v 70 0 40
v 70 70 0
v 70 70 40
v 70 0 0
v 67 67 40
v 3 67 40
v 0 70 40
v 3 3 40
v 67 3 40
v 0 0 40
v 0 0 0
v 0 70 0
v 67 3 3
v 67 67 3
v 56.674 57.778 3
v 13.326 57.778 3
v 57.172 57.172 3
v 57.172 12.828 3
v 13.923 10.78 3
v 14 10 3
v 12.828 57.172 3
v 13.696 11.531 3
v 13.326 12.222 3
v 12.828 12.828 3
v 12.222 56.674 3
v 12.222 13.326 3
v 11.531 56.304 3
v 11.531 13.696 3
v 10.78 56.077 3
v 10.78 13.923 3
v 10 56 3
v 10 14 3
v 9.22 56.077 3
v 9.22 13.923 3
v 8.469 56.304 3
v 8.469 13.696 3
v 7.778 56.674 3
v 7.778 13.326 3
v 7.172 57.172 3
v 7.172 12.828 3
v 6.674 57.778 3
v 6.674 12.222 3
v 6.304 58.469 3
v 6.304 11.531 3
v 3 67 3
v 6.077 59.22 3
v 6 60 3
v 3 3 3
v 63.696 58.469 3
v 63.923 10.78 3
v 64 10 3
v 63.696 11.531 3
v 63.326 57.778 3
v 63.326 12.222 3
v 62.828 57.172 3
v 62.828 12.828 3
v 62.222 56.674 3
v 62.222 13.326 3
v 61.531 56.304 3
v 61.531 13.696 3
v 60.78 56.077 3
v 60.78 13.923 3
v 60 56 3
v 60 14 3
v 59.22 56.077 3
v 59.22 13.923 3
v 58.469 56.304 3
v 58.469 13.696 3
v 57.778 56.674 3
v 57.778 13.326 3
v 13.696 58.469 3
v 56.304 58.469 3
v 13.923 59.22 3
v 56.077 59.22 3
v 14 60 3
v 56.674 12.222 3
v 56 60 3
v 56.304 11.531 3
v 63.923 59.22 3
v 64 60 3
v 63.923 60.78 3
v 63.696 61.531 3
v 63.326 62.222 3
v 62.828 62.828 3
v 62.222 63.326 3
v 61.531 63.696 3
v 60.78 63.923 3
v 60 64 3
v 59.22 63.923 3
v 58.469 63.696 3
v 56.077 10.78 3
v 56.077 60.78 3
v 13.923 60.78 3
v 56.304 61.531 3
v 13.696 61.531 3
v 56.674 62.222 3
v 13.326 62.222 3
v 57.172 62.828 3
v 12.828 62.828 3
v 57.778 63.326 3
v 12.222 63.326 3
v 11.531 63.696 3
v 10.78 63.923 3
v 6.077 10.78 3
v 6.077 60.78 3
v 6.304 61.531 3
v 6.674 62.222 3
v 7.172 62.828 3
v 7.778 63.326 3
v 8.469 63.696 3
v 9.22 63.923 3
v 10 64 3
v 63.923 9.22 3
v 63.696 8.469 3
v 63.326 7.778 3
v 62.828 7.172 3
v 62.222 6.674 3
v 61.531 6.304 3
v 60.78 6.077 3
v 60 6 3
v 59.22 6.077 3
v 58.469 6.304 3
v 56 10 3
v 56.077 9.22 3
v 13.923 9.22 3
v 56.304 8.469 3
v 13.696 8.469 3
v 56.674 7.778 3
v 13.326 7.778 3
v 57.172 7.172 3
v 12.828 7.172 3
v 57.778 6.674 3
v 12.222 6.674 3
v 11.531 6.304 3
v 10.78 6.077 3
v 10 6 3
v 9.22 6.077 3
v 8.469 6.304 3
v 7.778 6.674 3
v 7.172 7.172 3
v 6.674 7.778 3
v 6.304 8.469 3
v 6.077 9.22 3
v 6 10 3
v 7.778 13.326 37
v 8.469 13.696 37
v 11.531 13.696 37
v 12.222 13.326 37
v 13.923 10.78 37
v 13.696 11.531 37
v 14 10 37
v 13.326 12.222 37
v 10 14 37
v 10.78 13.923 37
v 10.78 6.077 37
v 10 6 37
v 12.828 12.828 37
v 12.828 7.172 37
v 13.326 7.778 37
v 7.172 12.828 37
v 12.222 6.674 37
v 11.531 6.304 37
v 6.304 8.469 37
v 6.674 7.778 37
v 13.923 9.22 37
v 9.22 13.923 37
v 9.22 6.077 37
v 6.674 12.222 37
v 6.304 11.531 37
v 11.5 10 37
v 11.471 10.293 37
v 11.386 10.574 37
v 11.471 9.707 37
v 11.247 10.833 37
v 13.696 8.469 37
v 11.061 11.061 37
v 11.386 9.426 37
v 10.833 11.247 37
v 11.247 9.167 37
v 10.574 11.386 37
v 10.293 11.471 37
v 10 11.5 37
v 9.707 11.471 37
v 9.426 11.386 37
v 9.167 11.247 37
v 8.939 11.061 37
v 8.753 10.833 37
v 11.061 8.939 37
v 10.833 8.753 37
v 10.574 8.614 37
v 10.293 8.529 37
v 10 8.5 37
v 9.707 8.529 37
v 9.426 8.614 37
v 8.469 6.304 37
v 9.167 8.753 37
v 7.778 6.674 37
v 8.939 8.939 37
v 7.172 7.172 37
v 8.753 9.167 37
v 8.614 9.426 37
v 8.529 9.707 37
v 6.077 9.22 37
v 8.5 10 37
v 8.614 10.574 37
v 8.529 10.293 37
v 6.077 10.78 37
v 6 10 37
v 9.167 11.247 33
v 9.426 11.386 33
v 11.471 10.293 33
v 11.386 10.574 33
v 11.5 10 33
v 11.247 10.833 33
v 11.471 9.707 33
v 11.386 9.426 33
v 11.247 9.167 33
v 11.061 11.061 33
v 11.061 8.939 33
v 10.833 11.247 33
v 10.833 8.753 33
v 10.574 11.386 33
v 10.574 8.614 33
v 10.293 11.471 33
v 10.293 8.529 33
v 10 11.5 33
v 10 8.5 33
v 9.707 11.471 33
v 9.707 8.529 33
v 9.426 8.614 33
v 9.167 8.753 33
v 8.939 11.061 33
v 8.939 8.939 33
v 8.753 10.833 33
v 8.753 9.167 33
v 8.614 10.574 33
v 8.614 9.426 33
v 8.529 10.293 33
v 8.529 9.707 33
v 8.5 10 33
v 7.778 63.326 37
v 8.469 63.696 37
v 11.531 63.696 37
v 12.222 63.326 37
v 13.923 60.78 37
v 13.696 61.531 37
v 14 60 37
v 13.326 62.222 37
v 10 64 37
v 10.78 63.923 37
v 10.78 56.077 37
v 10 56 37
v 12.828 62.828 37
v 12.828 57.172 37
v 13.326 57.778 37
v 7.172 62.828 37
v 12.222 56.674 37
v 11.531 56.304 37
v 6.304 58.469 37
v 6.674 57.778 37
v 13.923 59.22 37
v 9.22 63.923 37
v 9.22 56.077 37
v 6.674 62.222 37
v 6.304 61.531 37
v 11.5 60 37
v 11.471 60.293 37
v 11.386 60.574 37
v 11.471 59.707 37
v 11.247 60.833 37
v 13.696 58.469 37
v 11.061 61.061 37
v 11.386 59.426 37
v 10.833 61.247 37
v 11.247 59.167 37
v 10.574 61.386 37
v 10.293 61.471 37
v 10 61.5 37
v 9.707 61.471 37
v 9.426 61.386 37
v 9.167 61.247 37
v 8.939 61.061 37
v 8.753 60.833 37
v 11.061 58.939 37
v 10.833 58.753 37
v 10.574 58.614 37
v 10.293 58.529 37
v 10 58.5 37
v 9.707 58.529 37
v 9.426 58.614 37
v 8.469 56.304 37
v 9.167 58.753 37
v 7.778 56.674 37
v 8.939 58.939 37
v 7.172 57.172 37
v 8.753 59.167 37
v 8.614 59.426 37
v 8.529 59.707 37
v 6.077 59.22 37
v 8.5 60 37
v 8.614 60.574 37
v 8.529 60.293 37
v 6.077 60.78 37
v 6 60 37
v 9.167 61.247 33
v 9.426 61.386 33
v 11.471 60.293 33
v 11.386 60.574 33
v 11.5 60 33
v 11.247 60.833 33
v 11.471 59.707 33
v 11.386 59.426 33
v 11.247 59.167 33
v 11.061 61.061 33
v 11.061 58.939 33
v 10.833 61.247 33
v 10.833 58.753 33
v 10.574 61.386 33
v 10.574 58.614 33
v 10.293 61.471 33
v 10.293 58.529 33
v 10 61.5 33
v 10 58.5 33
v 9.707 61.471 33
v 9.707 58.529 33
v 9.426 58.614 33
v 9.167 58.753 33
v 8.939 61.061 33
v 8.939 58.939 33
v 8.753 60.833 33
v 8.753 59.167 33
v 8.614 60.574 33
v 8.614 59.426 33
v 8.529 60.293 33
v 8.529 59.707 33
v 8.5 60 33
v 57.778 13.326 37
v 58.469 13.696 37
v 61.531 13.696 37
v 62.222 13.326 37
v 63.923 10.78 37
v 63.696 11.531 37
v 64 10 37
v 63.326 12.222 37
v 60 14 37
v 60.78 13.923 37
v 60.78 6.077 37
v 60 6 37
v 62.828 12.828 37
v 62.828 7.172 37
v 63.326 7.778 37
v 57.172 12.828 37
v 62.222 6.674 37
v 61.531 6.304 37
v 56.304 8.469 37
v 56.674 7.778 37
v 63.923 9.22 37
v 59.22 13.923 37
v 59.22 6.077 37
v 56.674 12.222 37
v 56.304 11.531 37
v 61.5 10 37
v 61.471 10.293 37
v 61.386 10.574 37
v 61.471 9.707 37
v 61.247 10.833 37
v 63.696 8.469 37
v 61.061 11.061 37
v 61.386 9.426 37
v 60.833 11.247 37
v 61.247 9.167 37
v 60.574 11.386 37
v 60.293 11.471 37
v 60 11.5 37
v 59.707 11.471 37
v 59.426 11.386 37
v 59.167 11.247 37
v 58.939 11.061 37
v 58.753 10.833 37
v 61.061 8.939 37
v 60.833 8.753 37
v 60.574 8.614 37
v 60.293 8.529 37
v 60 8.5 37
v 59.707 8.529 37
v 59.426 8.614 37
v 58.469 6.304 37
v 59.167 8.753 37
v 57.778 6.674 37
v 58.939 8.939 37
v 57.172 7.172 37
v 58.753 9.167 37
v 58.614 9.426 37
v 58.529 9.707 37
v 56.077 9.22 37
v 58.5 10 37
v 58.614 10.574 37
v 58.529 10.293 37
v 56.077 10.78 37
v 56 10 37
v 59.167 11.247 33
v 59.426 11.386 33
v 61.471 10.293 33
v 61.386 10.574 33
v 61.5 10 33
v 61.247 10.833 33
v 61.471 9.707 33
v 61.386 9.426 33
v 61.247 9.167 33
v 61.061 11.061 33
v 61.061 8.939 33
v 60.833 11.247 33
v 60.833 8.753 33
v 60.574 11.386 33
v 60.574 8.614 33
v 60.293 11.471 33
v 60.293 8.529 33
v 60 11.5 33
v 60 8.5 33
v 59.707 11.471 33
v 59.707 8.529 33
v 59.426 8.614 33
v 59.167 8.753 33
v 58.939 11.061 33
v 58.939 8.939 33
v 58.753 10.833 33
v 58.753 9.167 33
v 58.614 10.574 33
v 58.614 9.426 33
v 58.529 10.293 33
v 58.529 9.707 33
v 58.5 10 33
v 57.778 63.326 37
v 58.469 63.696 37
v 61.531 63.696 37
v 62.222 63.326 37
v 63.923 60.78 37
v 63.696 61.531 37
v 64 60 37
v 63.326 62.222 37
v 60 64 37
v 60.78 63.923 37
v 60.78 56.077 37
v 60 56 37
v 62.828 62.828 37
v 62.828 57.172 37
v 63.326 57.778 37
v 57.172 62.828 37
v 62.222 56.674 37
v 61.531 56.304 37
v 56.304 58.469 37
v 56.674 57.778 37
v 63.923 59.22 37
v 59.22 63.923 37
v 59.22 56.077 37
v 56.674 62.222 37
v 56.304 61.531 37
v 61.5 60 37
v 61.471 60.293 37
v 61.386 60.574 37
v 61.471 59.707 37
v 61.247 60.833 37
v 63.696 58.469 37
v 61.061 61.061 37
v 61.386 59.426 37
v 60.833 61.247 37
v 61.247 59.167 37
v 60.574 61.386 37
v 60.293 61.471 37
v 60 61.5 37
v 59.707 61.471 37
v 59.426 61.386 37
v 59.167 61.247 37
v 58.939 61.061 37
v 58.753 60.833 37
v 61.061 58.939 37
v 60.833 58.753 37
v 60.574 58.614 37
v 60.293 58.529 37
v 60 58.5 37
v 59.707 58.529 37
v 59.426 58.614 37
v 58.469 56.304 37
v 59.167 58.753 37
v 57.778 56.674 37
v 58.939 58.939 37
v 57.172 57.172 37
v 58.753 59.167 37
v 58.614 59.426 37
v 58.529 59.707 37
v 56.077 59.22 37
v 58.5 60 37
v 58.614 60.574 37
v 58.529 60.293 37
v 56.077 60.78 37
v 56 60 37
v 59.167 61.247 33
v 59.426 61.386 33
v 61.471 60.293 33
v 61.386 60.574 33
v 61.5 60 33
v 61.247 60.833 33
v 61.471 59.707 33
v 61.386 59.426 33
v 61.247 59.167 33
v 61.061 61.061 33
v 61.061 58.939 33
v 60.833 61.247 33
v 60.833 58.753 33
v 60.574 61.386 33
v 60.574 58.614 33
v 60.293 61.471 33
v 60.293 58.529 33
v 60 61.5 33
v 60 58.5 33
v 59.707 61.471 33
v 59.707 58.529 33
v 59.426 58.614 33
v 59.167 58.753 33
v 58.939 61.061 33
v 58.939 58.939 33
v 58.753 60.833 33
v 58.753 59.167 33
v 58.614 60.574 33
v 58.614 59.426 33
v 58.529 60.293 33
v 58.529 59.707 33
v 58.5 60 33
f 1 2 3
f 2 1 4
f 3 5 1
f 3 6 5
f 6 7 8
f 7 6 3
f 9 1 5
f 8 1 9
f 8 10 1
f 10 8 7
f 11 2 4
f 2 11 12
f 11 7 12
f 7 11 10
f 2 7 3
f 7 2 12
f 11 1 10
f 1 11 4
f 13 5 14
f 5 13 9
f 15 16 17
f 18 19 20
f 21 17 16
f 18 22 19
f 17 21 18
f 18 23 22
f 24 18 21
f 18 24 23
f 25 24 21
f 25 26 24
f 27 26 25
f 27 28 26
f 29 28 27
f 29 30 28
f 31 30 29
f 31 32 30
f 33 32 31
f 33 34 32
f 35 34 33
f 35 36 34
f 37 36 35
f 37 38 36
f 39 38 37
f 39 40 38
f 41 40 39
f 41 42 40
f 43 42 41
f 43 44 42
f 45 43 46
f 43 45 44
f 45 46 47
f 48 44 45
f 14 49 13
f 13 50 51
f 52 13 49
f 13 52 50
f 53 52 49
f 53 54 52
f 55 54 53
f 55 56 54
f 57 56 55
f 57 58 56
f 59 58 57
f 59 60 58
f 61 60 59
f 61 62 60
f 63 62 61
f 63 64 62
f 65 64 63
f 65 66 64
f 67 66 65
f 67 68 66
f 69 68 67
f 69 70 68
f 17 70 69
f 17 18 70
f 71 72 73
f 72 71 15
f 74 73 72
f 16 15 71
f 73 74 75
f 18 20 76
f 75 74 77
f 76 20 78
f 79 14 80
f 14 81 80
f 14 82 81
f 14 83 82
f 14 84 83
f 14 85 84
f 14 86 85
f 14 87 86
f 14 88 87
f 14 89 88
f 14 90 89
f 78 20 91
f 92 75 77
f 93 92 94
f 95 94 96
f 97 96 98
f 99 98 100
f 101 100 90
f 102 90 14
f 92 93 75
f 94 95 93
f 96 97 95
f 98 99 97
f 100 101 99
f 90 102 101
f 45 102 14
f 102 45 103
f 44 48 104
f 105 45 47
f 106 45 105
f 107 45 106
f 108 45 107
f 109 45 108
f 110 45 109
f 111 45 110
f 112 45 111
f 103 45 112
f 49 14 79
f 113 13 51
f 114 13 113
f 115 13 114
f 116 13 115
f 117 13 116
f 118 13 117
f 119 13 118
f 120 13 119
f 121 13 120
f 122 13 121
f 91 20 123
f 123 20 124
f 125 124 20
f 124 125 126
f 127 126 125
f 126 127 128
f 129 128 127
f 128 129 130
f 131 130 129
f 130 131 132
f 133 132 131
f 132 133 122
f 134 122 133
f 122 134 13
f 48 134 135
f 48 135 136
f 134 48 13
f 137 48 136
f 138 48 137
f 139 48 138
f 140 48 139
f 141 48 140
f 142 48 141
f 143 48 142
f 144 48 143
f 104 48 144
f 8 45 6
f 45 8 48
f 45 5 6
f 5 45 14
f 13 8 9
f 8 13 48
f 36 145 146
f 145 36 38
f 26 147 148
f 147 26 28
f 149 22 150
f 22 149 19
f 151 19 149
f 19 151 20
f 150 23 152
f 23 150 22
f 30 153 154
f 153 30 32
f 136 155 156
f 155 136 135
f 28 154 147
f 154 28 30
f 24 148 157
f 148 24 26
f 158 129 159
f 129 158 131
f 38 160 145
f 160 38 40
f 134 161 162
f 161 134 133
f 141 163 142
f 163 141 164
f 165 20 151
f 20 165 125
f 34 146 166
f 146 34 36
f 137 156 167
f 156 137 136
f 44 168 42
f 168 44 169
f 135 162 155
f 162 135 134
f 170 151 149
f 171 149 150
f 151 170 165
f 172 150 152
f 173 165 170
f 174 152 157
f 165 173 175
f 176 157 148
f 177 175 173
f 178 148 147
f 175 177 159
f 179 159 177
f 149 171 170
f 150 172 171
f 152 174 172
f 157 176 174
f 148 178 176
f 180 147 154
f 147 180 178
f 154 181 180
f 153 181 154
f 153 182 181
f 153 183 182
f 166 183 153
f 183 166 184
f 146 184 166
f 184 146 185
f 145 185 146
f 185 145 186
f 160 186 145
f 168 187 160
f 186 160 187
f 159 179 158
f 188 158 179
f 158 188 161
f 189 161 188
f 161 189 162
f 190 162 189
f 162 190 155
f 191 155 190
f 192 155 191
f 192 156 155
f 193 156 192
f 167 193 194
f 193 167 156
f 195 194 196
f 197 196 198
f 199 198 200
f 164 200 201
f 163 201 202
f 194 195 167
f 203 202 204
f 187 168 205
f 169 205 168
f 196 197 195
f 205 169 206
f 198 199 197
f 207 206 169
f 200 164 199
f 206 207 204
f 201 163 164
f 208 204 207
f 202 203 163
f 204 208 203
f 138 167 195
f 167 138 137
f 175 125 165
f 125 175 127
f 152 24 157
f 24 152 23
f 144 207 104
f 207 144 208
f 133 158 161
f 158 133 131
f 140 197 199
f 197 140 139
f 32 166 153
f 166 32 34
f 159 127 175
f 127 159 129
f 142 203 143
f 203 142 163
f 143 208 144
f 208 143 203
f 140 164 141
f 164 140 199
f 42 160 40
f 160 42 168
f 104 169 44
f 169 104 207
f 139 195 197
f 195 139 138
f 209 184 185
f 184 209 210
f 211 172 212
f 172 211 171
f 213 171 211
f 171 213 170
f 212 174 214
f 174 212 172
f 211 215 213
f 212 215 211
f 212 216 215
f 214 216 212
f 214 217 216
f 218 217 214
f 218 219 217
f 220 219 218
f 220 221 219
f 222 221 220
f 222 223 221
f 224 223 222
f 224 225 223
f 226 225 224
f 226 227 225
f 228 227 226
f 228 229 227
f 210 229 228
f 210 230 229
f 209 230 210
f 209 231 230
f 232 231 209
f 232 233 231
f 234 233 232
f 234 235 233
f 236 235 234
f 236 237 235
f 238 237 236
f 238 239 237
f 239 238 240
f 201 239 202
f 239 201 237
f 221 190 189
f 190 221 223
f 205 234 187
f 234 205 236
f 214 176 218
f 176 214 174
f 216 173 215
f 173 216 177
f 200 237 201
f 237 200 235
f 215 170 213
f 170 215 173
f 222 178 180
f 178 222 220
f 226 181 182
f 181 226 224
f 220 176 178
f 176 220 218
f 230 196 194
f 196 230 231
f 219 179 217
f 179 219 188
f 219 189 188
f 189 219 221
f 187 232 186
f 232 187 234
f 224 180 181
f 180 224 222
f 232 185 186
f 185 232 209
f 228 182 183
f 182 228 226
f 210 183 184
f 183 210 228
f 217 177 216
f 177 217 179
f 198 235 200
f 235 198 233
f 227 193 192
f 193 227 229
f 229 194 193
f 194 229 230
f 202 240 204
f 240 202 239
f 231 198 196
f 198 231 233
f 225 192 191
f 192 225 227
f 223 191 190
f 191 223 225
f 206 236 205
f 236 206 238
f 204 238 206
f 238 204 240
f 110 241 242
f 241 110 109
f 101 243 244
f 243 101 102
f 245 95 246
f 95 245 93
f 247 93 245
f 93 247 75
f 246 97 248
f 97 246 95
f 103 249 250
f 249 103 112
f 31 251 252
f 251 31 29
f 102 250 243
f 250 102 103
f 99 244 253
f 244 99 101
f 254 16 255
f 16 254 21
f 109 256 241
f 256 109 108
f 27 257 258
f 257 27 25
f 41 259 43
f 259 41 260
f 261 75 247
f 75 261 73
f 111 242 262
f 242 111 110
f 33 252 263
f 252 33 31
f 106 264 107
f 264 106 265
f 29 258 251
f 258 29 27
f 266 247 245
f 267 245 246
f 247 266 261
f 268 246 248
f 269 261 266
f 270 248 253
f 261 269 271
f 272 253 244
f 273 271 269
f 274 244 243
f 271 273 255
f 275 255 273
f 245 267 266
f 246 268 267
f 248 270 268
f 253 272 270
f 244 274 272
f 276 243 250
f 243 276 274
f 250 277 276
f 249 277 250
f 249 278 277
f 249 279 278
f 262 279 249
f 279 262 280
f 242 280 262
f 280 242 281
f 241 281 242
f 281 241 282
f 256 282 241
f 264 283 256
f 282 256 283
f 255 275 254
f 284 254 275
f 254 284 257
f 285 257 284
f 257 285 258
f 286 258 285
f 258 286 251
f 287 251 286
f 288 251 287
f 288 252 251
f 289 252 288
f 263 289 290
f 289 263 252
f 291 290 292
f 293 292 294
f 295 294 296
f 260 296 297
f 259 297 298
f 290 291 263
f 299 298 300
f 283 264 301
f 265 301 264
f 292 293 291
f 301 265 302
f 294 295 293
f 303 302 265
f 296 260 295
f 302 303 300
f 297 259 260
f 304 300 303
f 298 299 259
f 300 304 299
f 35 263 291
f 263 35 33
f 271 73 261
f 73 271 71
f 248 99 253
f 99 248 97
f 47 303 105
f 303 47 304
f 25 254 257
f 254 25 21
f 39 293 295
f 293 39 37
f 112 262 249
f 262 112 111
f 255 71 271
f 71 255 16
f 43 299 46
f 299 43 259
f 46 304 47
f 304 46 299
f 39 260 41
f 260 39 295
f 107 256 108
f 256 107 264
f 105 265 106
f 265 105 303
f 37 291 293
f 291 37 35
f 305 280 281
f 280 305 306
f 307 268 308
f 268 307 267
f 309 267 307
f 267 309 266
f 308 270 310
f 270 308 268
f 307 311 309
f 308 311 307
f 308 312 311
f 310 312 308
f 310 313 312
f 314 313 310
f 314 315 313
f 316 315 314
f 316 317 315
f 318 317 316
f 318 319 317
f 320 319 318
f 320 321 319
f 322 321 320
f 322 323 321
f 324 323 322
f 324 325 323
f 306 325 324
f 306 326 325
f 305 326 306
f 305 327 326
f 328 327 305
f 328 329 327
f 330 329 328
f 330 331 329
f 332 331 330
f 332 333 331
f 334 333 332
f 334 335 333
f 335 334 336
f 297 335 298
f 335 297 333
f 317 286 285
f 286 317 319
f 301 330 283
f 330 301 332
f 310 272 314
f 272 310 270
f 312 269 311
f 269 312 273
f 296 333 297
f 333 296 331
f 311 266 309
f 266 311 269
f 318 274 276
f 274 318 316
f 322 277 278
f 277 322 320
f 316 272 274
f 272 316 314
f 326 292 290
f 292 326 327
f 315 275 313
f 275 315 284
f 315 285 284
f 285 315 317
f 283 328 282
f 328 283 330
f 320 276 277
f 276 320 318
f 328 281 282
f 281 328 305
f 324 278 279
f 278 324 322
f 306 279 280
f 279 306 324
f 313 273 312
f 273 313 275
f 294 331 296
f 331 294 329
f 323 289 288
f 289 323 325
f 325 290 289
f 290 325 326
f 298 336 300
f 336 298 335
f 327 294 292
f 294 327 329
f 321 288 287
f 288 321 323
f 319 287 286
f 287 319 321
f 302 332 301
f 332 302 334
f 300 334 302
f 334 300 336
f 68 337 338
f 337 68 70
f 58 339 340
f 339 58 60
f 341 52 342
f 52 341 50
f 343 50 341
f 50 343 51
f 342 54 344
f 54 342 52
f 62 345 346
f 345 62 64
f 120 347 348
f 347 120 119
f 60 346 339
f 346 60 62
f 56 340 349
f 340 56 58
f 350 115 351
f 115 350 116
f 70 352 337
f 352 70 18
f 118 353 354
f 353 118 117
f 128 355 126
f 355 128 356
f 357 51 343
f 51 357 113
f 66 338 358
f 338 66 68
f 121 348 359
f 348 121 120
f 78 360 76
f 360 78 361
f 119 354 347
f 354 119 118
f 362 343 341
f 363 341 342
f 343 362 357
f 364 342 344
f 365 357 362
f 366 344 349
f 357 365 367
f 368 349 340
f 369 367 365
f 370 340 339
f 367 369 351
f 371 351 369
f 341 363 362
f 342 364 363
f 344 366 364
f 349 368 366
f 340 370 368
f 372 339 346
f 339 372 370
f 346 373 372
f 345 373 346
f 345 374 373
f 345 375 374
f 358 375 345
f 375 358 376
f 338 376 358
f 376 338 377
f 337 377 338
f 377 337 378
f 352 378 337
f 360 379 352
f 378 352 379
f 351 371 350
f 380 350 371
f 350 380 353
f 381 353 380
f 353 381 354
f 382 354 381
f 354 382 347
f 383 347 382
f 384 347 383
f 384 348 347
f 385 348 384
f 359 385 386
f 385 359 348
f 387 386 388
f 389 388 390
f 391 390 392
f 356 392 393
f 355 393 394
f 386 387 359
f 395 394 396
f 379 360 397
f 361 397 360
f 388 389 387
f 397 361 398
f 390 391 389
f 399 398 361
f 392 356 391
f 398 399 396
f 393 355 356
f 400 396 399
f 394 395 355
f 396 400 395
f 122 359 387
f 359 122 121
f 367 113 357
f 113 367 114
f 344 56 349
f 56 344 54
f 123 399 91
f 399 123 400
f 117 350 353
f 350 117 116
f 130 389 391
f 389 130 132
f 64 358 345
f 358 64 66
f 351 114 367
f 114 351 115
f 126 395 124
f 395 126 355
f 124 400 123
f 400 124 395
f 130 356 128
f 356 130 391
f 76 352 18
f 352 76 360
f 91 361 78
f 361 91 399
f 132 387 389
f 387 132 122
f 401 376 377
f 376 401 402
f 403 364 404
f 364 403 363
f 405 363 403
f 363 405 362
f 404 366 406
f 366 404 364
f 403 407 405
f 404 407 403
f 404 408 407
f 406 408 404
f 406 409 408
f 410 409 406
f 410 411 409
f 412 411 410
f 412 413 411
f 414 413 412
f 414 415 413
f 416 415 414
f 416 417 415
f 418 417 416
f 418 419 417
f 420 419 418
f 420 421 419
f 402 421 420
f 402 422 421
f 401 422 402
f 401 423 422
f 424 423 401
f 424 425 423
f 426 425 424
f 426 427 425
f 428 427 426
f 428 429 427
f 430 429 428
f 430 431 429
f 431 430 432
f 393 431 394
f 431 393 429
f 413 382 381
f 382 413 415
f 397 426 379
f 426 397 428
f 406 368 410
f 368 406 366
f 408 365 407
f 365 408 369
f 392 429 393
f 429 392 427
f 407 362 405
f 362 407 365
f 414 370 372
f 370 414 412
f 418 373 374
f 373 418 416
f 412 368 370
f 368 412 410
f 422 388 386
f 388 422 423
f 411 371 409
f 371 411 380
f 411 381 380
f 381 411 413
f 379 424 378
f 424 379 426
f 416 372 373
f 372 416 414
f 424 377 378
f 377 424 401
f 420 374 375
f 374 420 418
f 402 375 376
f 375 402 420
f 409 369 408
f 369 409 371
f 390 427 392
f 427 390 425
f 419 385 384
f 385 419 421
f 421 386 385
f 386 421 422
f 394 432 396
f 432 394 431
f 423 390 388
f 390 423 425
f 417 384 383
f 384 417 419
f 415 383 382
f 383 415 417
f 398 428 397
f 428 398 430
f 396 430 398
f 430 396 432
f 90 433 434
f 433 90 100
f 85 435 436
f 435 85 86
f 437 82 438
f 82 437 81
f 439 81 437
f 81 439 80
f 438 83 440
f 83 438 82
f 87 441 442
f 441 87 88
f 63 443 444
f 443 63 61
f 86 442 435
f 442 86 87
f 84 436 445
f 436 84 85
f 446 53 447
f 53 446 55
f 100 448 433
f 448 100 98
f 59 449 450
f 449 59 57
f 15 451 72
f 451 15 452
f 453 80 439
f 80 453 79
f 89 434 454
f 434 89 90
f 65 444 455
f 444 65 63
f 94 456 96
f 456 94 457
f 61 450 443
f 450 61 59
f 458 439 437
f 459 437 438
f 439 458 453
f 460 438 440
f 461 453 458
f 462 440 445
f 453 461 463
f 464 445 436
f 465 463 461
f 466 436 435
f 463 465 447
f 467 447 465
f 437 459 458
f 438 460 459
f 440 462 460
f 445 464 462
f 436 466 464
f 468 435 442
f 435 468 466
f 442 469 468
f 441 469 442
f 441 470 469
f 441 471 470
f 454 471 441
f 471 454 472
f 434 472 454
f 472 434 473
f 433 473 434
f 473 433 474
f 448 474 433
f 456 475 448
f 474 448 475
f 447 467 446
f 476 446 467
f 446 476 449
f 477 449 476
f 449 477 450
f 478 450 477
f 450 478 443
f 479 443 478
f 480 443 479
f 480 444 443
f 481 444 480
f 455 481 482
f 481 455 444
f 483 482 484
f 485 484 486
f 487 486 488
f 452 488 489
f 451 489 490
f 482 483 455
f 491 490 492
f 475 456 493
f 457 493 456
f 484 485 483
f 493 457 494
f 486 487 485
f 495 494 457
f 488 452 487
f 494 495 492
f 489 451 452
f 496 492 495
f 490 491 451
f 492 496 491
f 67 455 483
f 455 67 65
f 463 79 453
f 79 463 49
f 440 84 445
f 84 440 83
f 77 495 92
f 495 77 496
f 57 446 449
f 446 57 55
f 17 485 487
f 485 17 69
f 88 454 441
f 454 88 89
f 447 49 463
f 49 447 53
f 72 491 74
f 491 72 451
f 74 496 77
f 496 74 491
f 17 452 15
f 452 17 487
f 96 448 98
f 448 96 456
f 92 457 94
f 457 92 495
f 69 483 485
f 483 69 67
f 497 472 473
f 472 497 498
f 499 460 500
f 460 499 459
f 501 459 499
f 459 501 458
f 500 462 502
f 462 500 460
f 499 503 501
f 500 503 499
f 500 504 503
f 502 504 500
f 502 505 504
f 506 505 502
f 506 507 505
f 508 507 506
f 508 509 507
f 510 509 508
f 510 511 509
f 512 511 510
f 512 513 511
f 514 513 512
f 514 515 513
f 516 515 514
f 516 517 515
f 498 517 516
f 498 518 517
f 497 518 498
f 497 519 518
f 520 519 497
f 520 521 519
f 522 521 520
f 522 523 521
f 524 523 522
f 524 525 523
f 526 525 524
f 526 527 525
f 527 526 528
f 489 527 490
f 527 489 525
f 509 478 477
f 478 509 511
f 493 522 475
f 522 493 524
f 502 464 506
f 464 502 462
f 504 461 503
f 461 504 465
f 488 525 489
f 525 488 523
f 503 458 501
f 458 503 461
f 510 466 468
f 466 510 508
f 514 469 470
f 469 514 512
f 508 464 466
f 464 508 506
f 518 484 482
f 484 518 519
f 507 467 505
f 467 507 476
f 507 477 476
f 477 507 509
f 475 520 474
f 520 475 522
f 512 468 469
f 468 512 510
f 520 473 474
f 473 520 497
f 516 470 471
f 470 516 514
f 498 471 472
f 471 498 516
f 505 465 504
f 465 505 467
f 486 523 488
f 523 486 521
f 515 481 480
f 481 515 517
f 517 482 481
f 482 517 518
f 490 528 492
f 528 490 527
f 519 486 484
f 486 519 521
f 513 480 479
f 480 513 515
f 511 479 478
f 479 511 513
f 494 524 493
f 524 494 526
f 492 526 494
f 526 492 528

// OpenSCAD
$fn = 32;

// ----------------------------------------------------------------------
// Enclosure box: bosses enclosure
// ----------------------------------------------------------------------

// --- parameters (mm) ---
box_l = 70;               // outer length, X
box_w = 70;               // outer width, Y
box_h = 40;               // outer height
wall_t = 3;               // wall thickness
boss_r = 4;               // corner boss radius
hole_r = 1.5;             // boss screw hole radius
boss_in = 10;             // boss inset from the corners
fit_tol = 0.05;           // tolerance for press fits, mm
free_tol = 0.3;           // tolerance for clearance fits, mm

inner_h = box_h - wall_t;  // cavity depth
boss_h = inner_h - 2;  // corner boss height

difference() {
  union() {
    difference() {
      cube([box_l, box_w, box_h]);
      translate([wall_t, wall_t, wall_t])
        cube([box_l - 2 * wall_t, box_w - 2 * wall_t, box_h]);
    }
    for (sx = [0, 1], sy = [0, 1])
      translate([sx ? box_l - boss_in : boss_in,
                 sy ? box_w - boss_in : boss_in, wall_t - 1])
        difference() {
          cylinder(r = boss_r, h = boss_h);
          translate([0, 0, boss_h - 4])
            cylinder(r = hole_r, h = 5);
        }
  }
}
